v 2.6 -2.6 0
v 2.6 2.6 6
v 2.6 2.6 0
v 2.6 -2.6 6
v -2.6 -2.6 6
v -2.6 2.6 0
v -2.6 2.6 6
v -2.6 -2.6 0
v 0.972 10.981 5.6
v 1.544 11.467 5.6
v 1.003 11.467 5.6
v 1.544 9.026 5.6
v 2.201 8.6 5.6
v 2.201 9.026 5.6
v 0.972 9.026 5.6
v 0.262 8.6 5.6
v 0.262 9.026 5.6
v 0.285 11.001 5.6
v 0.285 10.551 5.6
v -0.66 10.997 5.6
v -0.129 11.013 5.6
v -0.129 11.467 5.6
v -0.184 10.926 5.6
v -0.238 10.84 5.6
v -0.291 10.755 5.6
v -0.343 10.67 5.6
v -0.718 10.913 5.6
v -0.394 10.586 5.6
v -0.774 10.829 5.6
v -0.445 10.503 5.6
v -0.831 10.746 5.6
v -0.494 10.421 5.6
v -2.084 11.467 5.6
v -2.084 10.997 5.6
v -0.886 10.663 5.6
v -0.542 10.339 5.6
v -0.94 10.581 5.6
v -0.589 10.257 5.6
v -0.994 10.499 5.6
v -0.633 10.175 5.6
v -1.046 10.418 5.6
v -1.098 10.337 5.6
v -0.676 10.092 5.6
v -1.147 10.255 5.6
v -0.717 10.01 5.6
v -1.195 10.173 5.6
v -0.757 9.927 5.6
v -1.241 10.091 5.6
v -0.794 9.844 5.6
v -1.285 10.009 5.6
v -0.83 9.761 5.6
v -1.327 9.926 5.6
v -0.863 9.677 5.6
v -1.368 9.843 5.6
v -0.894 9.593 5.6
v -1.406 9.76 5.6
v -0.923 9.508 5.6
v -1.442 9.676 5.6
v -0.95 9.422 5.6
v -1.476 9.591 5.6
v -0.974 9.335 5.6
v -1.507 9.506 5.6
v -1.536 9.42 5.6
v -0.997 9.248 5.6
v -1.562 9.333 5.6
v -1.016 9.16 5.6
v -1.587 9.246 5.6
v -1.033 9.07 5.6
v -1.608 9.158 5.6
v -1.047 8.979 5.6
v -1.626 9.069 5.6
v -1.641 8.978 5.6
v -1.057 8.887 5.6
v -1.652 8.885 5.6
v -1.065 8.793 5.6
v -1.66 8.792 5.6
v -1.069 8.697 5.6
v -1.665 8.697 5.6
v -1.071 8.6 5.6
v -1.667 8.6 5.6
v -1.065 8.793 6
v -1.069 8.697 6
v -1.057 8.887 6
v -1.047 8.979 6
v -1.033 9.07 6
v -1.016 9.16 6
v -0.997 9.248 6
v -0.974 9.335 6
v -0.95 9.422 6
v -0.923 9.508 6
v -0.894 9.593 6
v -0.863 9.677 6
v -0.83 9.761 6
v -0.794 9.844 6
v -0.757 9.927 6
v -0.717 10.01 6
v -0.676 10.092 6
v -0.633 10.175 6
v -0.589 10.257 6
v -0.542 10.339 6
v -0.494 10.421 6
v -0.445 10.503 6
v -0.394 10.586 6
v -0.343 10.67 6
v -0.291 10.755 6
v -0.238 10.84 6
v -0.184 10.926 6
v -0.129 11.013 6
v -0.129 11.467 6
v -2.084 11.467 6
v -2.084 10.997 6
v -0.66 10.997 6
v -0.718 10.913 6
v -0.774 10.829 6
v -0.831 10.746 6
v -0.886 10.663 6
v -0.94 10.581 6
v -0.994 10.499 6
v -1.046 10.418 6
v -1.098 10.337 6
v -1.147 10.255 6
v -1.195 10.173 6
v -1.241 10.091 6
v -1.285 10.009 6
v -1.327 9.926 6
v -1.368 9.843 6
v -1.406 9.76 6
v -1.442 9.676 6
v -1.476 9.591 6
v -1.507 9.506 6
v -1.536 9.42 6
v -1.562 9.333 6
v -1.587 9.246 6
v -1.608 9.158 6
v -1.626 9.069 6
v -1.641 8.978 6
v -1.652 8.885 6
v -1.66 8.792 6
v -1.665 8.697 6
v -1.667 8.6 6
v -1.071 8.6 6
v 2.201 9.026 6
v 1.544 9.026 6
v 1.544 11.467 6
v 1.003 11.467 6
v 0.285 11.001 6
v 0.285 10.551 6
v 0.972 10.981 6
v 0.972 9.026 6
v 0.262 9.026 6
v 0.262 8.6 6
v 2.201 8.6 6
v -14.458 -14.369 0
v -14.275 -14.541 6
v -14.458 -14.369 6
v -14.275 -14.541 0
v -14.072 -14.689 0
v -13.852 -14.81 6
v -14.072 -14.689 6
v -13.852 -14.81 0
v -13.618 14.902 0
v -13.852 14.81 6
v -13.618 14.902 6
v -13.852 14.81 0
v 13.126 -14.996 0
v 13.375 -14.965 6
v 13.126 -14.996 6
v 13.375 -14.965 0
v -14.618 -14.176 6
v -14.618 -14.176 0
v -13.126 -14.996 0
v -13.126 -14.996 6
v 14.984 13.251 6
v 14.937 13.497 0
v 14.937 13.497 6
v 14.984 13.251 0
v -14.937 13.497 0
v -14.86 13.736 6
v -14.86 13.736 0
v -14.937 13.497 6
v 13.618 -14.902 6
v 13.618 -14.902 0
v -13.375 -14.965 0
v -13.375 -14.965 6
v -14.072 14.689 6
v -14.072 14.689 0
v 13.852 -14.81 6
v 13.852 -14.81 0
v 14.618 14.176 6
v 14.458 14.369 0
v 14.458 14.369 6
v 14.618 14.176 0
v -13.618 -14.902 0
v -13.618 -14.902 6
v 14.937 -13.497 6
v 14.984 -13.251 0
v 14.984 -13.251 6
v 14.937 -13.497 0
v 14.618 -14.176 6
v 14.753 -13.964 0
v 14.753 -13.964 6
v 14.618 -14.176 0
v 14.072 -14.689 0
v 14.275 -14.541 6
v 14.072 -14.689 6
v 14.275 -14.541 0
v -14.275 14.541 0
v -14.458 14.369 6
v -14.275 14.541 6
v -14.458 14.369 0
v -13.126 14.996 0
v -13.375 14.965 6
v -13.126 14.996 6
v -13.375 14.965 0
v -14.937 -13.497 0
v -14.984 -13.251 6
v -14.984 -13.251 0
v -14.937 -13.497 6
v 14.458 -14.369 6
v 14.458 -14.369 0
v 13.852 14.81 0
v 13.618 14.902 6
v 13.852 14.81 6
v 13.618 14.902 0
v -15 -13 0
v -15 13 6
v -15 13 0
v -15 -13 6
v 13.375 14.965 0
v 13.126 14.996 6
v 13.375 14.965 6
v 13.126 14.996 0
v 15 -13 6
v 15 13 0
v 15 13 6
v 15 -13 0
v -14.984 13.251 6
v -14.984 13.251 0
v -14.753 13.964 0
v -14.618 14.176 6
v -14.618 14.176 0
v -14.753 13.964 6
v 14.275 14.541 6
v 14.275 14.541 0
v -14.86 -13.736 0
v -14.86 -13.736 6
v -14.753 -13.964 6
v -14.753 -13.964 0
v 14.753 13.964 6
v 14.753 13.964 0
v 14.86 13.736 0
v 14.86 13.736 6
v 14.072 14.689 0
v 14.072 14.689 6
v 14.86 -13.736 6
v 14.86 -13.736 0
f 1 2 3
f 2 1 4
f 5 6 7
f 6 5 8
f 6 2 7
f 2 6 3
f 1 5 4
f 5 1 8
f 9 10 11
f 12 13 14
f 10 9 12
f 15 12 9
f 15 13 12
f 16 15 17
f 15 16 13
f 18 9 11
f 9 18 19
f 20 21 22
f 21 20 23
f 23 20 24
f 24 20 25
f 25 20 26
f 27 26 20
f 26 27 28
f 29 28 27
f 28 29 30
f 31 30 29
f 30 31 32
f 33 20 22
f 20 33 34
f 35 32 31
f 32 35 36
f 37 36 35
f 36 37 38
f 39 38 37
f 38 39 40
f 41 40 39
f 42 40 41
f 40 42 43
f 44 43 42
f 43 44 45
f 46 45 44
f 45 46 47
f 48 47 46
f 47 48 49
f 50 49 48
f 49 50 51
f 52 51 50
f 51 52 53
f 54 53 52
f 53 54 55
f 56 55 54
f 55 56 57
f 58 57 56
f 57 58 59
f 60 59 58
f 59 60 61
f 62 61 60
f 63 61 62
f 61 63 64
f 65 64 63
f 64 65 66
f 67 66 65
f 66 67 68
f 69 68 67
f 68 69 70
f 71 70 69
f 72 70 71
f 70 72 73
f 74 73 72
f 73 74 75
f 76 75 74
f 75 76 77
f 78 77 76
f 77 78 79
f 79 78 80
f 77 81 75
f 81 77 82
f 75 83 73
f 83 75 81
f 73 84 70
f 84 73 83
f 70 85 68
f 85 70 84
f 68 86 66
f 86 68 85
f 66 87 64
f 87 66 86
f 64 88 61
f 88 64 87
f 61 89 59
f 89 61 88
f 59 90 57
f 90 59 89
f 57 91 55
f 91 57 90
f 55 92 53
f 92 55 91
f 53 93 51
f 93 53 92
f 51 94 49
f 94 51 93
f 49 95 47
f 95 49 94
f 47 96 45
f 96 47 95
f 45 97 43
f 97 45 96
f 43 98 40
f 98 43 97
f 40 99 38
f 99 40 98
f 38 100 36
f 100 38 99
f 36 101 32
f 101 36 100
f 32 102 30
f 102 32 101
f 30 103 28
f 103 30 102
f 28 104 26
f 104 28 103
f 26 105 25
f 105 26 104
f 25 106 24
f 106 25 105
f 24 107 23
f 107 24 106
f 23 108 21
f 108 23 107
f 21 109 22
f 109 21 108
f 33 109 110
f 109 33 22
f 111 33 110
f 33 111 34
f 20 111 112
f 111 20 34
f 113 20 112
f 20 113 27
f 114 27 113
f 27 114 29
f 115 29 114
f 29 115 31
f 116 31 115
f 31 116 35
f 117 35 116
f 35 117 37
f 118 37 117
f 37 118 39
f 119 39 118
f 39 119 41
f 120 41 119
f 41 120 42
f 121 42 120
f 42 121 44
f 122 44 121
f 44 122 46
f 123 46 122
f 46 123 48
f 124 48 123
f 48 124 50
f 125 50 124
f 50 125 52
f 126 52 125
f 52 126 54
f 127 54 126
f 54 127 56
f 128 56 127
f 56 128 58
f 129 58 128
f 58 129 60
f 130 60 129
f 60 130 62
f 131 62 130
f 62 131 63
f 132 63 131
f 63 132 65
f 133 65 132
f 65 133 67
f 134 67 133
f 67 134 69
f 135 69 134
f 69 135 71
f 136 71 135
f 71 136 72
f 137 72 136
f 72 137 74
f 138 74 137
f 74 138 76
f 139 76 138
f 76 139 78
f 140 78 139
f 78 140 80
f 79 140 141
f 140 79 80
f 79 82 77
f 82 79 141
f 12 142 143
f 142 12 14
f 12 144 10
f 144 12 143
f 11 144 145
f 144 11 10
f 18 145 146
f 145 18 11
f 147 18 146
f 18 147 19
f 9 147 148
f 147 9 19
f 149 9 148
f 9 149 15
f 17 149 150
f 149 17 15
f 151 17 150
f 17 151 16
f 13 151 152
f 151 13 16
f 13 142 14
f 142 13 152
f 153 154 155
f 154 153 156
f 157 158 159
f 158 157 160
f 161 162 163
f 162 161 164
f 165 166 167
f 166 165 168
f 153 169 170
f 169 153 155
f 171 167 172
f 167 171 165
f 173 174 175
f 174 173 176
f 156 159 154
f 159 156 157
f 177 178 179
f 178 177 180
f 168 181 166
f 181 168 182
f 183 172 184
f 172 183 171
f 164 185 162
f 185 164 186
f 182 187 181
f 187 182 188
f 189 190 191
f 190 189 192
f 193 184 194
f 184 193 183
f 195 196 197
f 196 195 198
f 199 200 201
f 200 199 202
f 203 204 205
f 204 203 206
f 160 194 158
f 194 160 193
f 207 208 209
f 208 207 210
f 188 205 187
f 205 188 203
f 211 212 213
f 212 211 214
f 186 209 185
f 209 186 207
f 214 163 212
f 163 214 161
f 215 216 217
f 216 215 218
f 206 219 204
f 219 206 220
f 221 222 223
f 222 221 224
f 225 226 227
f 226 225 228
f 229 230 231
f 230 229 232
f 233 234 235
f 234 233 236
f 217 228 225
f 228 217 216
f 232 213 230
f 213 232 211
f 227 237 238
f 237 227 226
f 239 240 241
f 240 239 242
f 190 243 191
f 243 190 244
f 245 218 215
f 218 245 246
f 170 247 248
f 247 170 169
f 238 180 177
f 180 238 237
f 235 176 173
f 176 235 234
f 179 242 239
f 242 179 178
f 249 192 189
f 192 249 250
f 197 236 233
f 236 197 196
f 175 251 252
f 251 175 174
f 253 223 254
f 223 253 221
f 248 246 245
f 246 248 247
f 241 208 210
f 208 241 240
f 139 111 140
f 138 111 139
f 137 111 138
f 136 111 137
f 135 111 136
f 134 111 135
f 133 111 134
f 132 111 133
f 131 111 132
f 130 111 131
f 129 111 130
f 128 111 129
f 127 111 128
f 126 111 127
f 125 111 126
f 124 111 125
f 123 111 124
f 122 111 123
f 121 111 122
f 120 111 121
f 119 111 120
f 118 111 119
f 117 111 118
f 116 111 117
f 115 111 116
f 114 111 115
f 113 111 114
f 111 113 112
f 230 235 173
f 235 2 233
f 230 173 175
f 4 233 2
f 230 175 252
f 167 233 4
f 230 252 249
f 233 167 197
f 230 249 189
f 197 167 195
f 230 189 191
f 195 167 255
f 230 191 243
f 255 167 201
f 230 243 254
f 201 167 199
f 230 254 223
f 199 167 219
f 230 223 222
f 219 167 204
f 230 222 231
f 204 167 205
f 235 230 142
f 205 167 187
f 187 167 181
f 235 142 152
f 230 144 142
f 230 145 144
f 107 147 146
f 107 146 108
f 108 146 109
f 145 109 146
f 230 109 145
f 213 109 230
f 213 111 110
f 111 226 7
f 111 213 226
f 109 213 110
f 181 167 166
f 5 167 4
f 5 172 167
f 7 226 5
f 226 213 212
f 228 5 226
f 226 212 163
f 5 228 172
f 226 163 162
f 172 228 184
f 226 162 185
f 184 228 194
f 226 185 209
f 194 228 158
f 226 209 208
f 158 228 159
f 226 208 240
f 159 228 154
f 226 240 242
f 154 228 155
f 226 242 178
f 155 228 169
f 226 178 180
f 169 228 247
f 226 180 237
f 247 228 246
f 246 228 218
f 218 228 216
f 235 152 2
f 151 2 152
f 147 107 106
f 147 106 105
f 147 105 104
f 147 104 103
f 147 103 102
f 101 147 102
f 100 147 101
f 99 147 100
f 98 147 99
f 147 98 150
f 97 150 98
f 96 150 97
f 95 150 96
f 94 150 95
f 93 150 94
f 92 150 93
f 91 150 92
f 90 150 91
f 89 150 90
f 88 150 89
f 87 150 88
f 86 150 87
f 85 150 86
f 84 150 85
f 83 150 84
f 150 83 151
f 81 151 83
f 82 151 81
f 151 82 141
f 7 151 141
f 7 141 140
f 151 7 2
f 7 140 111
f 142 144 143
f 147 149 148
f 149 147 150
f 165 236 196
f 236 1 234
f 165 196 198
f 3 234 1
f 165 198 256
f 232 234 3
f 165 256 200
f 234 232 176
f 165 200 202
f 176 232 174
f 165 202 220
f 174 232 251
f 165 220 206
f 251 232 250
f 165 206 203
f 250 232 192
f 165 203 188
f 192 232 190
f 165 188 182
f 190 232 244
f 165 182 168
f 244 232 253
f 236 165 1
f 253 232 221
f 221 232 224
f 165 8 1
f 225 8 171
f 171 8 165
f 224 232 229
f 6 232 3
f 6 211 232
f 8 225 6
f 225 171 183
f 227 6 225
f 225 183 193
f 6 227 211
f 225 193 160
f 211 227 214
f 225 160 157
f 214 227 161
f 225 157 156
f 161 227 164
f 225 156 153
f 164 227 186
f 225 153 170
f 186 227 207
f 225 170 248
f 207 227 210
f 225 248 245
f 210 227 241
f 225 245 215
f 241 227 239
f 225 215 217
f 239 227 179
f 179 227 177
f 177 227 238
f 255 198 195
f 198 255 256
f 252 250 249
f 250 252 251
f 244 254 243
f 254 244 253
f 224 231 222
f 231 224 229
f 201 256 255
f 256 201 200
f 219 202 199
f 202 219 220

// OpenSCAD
$fn = 50;

difference() {
	union() {
		translate(v = [0, 0, 0]) {
			rotate(a = [0, 0, 0]) {
				difference() {
					union() {
						translate(v = [0, 0, 0]) {
							rotate(a = [0, 0, 0]) {
								difference() {
									union() {
										hull() {
											translate(v = [-13.0, 13.0, 0]) {
												cylinder(h = 6.0, r = 2);
											}
											translate(v = [13.0, 13.0, 0]) {
												cylinder(h = 6.0, r = 2);
											}
											translate(v = [-13.0, -13.0, 0]) {
												cylinder(h = 6.0, r = 2);
											}
											translate(v = [13.0, -13.0, 0]) {
												cylinder(h = 6.0, r = 2);
											}
										}
									}
									union() {
										translate(v = [-2.6, -2.6, -0.1]) {
											cube(size = [5.2, 5.2, 6.2]);
										}
										translate(v = [0.0, 10, 5.6]) {
											linear_extrude(height = 0.5) {
												text(font = "Arial:style=Bold", halign = "center", size = 3, text = "71", valign = "center");
											}
										}
									}
								}
							}
						}
					}
					union();
				}
			}
		}
	}
	union();
}
